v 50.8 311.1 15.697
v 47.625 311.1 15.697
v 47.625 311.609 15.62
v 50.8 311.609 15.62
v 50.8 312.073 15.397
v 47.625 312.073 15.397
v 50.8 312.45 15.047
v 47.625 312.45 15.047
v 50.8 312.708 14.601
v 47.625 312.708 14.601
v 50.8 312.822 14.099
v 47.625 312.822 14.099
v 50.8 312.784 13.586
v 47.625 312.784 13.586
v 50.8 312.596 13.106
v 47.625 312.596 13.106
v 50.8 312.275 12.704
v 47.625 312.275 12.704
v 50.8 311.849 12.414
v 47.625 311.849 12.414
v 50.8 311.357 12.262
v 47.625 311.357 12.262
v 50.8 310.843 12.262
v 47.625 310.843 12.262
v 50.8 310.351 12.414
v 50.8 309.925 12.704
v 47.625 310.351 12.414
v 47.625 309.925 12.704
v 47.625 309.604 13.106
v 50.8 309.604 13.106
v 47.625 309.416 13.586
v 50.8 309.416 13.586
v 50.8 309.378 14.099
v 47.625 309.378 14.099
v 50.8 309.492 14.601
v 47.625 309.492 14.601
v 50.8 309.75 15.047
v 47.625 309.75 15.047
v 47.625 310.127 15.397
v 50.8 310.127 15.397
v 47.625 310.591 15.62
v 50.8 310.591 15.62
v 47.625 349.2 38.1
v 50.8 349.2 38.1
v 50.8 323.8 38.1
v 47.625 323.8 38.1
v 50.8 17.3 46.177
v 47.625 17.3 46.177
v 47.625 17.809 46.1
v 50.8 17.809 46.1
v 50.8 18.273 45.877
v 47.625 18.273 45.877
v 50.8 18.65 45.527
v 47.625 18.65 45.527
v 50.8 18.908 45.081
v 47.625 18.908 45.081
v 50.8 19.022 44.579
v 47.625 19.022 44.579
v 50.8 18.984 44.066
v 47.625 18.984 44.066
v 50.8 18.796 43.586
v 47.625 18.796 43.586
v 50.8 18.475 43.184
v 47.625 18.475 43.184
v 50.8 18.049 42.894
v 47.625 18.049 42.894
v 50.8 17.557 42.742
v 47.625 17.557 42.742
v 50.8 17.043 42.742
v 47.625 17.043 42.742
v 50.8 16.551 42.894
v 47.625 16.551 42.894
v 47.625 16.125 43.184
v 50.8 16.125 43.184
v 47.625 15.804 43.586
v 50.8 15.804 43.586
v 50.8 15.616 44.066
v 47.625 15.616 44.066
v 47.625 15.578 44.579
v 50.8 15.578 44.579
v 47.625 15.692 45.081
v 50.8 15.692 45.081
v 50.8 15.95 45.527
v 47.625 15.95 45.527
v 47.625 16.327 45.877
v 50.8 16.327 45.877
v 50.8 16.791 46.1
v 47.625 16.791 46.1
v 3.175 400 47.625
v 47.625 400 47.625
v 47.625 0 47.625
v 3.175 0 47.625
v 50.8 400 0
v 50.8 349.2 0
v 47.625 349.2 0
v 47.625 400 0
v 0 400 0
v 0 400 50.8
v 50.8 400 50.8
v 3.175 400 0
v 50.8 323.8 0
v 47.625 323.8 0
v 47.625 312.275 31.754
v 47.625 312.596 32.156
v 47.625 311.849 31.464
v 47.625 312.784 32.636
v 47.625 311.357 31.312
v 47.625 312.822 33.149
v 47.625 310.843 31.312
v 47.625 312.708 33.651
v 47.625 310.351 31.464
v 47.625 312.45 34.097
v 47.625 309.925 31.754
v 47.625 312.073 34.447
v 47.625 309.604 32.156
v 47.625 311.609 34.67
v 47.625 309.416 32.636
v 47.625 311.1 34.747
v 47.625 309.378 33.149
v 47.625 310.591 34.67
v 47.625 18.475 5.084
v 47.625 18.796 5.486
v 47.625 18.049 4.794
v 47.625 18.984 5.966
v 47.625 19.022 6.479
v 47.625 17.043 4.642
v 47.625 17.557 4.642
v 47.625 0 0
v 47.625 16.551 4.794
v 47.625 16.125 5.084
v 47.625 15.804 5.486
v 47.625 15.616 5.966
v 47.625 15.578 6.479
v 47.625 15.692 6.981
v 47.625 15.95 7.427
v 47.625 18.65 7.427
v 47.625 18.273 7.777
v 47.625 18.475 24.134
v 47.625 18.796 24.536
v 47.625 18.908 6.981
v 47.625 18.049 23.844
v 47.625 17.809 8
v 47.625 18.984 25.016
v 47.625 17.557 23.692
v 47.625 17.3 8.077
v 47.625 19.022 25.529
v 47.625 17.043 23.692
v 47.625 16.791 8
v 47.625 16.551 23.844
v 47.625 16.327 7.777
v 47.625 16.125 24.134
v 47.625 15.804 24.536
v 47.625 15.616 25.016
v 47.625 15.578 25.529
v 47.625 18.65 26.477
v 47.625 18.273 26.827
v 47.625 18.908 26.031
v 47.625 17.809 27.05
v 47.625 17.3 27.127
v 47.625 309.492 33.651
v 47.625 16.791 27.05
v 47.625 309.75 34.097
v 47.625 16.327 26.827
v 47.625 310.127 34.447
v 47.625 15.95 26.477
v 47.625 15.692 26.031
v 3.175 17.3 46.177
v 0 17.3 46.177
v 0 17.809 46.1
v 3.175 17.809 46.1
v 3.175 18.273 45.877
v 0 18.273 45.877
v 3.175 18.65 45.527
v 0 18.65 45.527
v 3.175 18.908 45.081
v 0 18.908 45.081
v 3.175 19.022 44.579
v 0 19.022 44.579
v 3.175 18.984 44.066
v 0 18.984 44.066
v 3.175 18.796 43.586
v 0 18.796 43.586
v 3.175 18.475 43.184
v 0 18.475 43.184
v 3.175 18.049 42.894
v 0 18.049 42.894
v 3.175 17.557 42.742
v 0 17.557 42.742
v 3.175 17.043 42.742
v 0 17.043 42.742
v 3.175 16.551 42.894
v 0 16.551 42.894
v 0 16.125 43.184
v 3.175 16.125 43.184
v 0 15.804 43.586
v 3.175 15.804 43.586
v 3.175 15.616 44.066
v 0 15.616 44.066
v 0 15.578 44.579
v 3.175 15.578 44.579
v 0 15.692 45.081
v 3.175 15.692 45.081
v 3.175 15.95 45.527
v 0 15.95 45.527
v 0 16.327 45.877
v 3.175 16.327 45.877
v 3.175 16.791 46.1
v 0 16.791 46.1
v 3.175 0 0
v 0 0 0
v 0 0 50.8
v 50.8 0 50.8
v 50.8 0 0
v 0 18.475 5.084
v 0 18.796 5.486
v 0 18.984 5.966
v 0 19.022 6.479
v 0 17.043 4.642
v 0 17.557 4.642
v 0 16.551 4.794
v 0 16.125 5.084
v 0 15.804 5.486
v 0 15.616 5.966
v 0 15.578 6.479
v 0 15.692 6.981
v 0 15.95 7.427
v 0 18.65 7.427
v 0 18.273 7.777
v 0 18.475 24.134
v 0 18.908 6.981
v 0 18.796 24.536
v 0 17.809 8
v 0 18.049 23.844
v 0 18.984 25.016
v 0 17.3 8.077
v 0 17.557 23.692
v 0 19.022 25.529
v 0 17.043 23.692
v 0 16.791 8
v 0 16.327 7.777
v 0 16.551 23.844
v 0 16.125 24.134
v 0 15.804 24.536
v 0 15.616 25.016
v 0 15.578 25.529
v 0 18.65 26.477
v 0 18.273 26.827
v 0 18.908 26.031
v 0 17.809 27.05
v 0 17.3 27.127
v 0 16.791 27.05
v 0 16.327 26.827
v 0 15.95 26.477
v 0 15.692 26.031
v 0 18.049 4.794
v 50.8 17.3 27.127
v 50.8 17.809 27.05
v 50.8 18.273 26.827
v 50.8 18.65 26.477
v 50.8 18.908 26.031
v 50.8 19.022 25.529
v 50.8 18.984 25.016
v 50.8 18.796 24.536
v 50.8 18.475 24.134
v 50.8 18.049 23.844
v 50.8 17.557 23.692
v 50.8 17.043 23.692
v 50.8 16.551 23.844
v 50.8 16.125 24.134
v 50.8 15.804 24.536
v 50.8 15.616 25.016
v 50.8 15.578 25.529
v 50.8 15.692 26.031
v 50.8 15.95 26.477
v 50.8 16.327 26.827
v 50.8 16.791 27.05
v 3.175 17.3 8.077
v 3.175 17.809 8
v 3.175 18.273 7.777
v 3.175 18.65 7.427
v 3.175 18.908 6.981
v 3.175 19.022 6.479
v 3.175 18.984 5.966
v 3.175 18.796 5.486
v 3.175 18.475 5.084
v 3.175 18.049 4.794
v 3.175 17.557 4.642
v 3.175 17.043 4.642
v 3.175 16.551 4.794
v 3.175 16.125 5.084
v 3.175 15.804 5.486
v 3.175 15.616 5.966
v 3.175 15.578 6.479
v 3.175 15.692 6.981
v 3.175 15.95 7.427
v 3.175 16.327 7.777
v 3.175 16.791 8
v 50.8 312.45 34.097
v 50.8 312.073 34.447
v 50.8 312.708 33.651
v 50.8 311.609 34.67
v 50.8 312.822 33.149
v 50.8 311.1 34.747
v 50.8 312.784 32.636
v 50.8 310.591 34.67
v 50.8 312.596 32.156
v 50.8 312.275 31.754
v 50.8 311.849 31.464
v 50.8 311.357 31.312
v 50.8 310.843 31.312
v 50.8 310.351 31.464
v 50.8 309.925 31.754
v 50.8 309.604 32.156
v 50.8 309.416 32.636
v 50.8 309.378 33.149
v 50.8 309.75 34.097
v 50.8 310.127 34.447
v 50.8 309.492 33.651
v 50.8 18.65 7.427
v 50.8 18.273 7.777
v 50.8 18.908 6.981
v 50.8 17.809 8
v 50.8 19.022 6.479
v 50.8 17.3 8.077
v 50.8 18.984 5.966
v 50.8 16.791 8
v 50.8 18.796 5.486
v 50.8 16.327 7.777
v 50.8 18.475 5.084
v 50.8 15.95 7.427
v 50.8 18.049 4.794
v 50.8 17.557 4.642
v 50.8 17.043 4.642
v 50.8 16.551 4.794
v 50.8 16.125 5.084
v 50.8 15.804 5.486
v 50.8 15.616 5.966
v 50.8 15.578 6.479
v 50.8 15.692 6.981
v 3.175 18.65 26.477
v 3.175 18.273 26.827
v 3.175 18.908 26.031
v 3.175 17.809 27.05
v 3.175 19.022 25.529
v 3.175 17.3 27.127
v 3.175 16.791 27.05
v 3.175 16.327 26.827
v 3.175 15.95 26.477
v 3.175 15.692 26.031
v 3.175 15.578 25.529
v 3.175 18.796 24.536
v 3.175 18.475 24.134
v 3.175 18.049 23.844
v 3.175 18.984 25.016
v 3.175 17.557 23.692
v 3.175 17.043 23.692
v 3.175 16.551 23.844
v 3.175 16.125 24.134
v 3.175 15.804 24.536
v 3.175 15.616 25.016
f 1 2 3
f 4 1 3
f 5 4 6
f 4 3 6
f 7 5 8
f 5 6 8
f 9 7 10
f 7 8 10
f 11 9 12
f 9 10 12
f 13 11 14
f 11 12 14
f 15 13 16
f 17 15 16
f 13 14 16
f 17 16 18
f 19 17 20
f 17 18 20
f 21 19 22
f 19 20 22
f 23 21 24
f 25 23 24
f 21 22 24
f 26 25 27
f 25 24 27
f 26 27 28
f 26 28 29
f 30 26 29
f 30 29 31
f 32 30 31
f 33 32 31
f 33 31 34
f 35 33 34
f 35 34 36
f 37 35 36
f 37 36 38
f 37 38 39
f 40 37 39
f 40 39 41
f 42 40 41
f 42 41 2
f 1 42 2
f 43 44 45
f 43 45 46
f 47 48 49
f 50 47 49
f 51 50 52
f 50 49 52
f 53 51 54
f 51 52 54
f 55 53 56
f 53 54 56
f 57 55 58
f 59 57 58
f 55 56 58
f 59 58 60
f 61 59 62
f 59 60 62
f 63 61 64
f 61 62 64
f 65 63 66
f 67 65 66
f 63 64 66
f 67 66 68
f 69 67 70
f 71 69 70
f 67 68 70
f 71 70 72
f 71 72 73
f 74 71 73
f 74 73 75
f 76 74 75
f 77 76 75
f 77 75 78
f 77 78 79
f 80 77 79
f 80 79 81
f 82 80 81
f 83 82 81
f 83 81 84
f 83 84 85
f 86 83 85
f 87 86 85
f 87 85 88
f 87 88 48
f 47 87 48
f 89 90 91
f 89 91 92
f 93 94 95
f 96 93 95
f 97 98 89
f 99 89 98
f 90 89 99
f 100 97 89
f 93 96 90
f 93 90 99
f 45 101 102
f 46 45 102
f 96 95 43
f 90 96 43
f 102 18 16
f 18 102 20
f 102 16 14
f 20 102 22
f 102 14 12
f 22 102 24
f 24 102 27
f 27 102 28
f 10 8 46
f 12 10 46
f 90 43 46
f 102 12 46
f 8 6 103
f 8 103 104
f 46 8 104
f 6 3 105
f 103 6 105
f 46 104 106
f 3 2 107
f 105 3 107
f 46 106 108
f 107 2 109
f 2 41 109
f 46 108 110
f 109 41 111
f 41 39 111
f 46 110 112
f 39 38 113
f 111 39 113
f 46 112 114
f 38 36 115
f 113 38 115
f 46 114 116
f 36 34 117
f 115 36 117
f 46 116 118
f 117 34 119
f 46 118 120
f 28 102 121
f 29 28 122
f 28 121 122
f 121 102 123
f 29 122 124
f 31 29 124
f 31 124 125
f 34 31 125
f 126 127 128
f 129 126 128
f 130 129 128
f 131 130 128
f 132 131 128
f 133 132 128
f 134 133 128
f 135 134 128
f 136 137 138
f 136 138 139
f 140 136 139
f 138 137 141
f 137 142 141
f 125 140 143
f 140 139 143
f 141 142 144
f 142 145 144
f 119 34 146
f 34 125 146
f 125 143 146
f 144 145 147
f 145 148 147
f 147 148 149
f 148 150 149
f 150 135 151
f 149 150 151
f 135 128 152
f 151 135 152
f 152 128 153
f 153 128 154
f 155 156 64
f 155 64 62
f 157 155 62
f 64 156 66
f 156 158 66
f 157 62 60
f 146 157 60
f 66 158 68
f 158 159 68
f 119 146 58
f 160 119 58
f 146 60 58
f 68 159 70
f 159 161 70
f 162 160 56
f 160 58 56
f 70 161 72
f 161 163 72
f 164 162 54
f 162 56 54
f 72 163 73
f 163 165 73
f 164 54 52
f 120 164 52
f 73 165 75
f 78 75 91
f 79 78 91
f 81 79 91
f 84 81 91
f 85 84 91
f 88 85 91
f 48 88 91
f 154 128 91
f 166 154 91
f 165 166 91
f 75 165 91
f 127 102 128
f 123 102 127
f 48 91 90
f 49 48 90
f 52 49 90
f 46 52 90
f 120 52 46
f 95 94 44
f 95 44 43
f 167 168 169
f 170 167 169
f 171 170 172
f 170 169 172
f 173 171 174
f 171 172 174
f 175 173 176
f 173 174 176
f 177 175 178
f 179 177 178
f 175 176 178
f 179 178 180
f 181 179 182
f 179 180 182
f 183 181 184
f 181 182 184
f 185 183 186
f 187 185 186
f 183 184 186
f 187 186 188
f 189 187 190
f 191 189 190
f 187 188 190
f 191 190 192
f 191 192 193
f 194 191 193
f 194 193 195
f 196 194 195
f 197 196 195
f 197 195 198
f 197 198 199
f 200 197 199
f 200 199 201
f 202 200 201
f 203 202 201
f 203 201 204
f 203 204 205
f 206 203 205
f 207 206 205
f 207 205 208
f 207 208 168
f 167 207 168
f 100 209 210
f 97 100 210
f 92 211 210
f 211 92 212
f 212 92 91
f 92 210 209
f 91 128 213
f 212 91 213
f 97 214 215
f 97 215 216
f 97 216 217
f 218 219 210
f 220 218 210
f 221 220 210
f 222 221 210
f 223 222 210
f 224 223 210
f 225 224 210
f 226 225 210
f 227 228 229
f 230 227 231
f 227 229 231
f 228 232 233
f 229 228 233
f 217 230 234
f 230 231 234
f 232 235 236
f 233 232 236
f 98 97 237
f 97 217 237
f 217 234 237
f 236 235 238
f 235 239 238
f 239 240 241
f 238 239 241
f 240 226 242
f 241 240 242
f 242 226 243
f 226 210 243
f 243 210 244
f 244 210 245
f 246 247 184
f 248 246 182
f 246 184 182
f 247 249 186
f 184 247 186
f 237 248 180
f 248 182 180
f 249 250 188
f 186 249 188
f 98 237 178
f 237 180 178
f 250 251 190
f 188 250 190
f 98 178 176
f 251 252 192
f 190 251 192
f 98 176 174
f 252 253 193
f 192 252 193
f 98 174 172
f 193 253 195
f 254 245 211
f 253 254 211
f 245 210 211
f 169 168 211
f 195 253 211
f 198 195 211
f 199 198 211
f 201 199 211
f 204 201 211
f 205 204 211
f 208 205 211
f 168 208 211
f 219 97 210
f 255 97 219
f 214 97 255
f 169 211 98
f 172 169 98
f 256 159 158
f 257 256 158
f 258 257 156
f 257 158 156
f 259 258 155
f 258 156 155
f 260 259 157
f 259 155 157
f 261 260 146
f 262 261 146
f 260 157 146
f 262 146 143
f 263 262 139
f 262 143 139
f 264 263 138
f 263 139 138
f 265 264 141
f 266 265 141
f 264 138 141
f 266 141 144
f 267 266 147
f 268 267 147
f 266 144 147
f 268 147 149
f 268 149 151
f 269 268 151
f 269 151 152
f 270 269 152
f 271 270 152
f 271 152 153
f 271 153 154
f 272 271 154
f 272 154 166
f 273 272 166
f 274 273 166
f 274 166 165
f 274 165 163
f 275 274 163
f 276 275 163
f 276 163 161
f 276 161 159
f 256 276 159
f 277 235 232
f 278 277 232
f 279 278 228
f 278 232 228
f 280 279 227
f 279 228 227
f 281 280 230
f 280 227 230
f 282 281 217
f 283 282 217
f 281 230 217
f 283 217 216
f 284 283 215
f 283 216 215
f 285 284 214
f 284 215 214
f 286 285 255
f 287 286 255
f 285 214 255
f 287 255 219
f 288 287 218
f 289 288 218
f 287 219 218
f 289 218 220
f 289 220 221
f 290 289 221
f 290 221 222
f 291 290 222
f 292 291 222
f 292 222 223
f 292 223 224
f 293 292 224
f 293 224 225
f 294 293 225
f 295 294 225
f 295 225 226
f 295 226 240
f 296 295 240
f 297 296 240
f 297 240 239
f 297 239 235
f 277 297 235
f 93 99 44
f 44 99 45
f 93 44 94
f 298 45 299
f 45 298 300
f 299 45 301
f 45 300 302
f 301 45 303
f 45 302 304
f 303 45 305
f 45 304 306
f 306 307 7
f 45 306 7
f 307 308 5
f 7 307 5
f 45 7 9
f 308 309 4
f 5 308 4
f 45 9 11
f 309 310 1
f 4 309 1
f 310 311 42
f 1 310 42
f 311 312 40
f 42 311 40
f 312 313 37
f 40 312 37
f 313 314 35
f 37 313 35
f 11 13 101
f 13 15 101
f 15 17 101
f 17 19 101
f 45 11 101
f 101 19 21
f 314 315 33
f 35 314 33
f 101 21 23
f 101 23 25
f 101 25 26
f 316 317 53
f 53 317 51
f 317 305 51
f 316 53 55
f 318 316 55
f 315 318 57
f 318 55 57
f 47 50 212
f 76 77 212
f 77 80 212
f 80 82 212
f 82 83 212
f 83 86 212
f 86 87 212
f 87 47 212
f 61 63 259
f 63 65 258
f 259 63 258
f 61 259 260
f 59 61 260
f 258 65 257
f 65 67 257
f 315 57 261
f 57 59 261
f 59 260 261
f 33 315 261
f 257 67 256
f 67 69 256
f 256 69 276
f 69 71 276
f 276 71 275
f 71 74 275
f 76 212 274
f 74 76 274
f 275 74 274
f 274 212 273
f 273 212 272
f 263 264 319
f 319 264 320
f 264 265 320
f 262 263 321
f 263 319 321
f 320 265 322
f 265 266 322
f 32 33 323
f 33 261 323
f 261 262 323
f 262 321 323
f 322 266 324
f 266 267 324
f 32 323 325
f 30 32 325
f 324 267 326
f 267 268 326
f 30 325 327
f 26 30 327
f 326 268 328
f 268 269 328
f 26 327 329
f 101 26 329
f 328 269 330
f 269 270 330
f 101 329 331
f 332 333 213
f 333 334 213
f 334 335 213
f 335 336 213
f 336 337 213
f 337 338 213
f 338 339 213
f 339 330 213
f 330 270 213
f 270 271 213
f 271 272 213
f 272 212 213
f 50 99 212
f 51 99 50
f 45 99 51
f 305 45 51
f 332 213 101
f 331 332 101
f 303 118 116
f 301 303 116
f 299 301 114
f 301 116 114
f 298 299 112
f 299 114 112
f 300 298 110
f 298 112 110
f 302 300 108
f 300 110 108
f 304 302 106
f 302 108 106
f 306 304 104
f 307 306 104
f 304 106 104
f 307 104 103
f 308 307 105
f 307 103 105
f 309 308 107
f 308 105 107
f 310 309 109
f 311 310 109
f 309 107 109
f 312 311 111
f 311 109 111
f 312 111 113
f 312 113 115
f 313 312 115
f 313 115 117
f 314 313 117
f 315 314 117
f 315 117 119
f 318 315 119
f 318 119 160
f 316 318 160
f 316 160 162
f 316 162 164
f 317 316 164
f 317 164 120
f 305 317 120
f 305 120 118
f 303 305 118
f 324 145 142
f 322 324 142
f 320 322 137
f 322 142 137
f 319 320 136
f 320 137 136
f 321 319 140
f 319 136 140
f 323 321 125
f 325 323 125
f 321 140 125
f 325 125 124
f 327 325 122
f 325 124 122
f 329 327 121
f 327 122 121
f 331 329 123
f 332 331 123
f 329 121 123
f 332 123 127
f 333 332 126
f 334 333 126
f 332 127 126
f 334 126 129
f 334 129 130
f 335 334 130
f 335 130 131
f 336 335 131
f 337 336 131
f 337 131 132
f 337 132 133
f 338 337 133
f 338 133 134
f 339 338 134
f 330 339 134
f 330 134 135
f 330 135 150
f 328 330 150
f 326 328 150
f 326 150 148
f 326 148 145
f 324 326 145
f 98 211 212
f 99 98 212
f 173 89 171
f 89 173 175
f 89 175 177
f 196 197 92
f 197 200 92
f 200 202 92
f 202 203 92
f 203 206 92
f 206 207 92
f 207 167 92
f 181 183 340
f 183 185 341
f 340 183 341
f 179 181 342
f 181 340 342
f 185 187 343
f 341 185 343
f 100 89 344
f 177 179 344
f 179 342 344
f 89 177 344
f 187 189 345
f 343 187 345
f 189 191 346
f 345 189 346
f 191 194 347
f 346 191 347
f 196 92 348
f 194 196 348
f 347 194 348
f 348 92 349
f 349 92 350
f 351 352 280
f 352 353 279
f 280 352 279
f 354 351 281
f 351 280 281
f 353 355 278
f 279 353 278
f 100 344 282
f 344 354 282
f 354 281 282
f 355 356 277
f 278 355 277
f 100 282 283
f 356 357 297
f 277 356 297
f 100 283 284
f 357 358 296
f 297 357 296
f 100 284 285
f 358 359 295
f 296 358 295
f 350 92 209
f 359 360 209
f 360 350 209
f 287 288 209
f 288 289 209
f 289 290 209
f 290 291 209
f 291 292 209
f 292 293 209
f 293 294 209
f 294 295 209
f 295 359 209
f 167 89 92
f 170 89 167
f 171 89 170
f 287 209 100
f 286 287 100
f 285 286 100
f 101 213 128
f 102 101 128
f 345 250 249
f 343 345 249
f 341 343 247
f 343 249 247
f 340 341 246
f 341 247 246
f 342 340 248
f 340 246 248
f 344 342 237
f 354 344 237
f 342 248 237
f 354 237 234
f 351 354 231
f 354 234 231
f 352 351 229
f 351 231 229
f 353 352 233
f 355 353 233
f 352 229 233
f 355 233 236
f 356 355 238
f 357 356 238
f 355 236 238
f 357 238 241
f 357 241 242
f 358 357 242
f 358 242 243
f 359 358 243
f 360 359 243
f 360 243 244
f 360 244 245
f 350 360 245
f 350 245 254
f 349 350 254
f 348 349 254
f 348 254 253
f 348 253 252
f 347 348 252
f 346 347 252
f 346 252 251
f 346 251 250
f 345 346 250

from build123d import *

# Parameters (mm, degrees)
BOSS_EXTRUDE1_DEPTH           = 400
SKETCH2_W                     = 3.175
SKETCH2_H                     = 25.4
CUT_EXTRUDE1_DEPTH            = 38.1
TAP_DRILL_FOR_8_32_TAP1_D     = 3.4544
TAP_DRILL_FOR_8_32_TAP2_D     = 3.4544
TAP_DRILL_FOR_8_32_TAP2_DEPTH = 3.175


with BuildPart() as part:
    # Sketch1 → Boss-Extrude1 (new body)
    with BuildSketch(Plane(origin=(0, 0, 0), x_dir=(1, 0, 0), z_dir=(0, 1, 0))):
        Polygon((0, 0), (0, -50.8), (50.8, -50.8), (50.8, 0), (47.625, 0), (47.625, -47.625), (3.175, -47.625), (3.175, 0), align=None)
    extrude(amount=BOSS_EXTRUDE1_DEPTH)

    # Sketch2 → Cut-Extrude1 (cut)
    with BuildSketch(Plane(origin=(0, 0, 0), x_dir=(-1, 0, 0), z_dir=(0, 0, -1))):
        with Locations((-49.2125, 336.5)):
            Rectangle(SKETCH2_W, SKETCH2_H)
    extrude(amount=-CUT_EXTRUDE1_DEPTH, mode=Mode.SUBTRACT)

    # Tap Drill for #8-32 Tap1 (through all)
    with Locations(Plane(origin=(50.8, 0, 0), x_dir=(0, 0, -1), z_dir=(1, 0, 0))):
        with Locations((-44.45, 17.3), (-25.4, 17.3), (-6.35, 17.3)):
            Hole(TAP_DRILL_FOR_8_32_TAP1_D / 2)

    # Tap Drill for #8-32 Tap2
    with Locations(Plane(origin=(50.8, 0, 0), x_dir=(0, 0, -1), z_dir=(1, 0, 0))):
        with Locations((-33.02, 311.1), (-13.97, 311.1)):
            Hole(TAP_DRILL_FOR_8_32_TAP2_D / 2, depth=TAP_DRILL_FOR_8_32_TAP2_DEPTH)


solid = part.part
